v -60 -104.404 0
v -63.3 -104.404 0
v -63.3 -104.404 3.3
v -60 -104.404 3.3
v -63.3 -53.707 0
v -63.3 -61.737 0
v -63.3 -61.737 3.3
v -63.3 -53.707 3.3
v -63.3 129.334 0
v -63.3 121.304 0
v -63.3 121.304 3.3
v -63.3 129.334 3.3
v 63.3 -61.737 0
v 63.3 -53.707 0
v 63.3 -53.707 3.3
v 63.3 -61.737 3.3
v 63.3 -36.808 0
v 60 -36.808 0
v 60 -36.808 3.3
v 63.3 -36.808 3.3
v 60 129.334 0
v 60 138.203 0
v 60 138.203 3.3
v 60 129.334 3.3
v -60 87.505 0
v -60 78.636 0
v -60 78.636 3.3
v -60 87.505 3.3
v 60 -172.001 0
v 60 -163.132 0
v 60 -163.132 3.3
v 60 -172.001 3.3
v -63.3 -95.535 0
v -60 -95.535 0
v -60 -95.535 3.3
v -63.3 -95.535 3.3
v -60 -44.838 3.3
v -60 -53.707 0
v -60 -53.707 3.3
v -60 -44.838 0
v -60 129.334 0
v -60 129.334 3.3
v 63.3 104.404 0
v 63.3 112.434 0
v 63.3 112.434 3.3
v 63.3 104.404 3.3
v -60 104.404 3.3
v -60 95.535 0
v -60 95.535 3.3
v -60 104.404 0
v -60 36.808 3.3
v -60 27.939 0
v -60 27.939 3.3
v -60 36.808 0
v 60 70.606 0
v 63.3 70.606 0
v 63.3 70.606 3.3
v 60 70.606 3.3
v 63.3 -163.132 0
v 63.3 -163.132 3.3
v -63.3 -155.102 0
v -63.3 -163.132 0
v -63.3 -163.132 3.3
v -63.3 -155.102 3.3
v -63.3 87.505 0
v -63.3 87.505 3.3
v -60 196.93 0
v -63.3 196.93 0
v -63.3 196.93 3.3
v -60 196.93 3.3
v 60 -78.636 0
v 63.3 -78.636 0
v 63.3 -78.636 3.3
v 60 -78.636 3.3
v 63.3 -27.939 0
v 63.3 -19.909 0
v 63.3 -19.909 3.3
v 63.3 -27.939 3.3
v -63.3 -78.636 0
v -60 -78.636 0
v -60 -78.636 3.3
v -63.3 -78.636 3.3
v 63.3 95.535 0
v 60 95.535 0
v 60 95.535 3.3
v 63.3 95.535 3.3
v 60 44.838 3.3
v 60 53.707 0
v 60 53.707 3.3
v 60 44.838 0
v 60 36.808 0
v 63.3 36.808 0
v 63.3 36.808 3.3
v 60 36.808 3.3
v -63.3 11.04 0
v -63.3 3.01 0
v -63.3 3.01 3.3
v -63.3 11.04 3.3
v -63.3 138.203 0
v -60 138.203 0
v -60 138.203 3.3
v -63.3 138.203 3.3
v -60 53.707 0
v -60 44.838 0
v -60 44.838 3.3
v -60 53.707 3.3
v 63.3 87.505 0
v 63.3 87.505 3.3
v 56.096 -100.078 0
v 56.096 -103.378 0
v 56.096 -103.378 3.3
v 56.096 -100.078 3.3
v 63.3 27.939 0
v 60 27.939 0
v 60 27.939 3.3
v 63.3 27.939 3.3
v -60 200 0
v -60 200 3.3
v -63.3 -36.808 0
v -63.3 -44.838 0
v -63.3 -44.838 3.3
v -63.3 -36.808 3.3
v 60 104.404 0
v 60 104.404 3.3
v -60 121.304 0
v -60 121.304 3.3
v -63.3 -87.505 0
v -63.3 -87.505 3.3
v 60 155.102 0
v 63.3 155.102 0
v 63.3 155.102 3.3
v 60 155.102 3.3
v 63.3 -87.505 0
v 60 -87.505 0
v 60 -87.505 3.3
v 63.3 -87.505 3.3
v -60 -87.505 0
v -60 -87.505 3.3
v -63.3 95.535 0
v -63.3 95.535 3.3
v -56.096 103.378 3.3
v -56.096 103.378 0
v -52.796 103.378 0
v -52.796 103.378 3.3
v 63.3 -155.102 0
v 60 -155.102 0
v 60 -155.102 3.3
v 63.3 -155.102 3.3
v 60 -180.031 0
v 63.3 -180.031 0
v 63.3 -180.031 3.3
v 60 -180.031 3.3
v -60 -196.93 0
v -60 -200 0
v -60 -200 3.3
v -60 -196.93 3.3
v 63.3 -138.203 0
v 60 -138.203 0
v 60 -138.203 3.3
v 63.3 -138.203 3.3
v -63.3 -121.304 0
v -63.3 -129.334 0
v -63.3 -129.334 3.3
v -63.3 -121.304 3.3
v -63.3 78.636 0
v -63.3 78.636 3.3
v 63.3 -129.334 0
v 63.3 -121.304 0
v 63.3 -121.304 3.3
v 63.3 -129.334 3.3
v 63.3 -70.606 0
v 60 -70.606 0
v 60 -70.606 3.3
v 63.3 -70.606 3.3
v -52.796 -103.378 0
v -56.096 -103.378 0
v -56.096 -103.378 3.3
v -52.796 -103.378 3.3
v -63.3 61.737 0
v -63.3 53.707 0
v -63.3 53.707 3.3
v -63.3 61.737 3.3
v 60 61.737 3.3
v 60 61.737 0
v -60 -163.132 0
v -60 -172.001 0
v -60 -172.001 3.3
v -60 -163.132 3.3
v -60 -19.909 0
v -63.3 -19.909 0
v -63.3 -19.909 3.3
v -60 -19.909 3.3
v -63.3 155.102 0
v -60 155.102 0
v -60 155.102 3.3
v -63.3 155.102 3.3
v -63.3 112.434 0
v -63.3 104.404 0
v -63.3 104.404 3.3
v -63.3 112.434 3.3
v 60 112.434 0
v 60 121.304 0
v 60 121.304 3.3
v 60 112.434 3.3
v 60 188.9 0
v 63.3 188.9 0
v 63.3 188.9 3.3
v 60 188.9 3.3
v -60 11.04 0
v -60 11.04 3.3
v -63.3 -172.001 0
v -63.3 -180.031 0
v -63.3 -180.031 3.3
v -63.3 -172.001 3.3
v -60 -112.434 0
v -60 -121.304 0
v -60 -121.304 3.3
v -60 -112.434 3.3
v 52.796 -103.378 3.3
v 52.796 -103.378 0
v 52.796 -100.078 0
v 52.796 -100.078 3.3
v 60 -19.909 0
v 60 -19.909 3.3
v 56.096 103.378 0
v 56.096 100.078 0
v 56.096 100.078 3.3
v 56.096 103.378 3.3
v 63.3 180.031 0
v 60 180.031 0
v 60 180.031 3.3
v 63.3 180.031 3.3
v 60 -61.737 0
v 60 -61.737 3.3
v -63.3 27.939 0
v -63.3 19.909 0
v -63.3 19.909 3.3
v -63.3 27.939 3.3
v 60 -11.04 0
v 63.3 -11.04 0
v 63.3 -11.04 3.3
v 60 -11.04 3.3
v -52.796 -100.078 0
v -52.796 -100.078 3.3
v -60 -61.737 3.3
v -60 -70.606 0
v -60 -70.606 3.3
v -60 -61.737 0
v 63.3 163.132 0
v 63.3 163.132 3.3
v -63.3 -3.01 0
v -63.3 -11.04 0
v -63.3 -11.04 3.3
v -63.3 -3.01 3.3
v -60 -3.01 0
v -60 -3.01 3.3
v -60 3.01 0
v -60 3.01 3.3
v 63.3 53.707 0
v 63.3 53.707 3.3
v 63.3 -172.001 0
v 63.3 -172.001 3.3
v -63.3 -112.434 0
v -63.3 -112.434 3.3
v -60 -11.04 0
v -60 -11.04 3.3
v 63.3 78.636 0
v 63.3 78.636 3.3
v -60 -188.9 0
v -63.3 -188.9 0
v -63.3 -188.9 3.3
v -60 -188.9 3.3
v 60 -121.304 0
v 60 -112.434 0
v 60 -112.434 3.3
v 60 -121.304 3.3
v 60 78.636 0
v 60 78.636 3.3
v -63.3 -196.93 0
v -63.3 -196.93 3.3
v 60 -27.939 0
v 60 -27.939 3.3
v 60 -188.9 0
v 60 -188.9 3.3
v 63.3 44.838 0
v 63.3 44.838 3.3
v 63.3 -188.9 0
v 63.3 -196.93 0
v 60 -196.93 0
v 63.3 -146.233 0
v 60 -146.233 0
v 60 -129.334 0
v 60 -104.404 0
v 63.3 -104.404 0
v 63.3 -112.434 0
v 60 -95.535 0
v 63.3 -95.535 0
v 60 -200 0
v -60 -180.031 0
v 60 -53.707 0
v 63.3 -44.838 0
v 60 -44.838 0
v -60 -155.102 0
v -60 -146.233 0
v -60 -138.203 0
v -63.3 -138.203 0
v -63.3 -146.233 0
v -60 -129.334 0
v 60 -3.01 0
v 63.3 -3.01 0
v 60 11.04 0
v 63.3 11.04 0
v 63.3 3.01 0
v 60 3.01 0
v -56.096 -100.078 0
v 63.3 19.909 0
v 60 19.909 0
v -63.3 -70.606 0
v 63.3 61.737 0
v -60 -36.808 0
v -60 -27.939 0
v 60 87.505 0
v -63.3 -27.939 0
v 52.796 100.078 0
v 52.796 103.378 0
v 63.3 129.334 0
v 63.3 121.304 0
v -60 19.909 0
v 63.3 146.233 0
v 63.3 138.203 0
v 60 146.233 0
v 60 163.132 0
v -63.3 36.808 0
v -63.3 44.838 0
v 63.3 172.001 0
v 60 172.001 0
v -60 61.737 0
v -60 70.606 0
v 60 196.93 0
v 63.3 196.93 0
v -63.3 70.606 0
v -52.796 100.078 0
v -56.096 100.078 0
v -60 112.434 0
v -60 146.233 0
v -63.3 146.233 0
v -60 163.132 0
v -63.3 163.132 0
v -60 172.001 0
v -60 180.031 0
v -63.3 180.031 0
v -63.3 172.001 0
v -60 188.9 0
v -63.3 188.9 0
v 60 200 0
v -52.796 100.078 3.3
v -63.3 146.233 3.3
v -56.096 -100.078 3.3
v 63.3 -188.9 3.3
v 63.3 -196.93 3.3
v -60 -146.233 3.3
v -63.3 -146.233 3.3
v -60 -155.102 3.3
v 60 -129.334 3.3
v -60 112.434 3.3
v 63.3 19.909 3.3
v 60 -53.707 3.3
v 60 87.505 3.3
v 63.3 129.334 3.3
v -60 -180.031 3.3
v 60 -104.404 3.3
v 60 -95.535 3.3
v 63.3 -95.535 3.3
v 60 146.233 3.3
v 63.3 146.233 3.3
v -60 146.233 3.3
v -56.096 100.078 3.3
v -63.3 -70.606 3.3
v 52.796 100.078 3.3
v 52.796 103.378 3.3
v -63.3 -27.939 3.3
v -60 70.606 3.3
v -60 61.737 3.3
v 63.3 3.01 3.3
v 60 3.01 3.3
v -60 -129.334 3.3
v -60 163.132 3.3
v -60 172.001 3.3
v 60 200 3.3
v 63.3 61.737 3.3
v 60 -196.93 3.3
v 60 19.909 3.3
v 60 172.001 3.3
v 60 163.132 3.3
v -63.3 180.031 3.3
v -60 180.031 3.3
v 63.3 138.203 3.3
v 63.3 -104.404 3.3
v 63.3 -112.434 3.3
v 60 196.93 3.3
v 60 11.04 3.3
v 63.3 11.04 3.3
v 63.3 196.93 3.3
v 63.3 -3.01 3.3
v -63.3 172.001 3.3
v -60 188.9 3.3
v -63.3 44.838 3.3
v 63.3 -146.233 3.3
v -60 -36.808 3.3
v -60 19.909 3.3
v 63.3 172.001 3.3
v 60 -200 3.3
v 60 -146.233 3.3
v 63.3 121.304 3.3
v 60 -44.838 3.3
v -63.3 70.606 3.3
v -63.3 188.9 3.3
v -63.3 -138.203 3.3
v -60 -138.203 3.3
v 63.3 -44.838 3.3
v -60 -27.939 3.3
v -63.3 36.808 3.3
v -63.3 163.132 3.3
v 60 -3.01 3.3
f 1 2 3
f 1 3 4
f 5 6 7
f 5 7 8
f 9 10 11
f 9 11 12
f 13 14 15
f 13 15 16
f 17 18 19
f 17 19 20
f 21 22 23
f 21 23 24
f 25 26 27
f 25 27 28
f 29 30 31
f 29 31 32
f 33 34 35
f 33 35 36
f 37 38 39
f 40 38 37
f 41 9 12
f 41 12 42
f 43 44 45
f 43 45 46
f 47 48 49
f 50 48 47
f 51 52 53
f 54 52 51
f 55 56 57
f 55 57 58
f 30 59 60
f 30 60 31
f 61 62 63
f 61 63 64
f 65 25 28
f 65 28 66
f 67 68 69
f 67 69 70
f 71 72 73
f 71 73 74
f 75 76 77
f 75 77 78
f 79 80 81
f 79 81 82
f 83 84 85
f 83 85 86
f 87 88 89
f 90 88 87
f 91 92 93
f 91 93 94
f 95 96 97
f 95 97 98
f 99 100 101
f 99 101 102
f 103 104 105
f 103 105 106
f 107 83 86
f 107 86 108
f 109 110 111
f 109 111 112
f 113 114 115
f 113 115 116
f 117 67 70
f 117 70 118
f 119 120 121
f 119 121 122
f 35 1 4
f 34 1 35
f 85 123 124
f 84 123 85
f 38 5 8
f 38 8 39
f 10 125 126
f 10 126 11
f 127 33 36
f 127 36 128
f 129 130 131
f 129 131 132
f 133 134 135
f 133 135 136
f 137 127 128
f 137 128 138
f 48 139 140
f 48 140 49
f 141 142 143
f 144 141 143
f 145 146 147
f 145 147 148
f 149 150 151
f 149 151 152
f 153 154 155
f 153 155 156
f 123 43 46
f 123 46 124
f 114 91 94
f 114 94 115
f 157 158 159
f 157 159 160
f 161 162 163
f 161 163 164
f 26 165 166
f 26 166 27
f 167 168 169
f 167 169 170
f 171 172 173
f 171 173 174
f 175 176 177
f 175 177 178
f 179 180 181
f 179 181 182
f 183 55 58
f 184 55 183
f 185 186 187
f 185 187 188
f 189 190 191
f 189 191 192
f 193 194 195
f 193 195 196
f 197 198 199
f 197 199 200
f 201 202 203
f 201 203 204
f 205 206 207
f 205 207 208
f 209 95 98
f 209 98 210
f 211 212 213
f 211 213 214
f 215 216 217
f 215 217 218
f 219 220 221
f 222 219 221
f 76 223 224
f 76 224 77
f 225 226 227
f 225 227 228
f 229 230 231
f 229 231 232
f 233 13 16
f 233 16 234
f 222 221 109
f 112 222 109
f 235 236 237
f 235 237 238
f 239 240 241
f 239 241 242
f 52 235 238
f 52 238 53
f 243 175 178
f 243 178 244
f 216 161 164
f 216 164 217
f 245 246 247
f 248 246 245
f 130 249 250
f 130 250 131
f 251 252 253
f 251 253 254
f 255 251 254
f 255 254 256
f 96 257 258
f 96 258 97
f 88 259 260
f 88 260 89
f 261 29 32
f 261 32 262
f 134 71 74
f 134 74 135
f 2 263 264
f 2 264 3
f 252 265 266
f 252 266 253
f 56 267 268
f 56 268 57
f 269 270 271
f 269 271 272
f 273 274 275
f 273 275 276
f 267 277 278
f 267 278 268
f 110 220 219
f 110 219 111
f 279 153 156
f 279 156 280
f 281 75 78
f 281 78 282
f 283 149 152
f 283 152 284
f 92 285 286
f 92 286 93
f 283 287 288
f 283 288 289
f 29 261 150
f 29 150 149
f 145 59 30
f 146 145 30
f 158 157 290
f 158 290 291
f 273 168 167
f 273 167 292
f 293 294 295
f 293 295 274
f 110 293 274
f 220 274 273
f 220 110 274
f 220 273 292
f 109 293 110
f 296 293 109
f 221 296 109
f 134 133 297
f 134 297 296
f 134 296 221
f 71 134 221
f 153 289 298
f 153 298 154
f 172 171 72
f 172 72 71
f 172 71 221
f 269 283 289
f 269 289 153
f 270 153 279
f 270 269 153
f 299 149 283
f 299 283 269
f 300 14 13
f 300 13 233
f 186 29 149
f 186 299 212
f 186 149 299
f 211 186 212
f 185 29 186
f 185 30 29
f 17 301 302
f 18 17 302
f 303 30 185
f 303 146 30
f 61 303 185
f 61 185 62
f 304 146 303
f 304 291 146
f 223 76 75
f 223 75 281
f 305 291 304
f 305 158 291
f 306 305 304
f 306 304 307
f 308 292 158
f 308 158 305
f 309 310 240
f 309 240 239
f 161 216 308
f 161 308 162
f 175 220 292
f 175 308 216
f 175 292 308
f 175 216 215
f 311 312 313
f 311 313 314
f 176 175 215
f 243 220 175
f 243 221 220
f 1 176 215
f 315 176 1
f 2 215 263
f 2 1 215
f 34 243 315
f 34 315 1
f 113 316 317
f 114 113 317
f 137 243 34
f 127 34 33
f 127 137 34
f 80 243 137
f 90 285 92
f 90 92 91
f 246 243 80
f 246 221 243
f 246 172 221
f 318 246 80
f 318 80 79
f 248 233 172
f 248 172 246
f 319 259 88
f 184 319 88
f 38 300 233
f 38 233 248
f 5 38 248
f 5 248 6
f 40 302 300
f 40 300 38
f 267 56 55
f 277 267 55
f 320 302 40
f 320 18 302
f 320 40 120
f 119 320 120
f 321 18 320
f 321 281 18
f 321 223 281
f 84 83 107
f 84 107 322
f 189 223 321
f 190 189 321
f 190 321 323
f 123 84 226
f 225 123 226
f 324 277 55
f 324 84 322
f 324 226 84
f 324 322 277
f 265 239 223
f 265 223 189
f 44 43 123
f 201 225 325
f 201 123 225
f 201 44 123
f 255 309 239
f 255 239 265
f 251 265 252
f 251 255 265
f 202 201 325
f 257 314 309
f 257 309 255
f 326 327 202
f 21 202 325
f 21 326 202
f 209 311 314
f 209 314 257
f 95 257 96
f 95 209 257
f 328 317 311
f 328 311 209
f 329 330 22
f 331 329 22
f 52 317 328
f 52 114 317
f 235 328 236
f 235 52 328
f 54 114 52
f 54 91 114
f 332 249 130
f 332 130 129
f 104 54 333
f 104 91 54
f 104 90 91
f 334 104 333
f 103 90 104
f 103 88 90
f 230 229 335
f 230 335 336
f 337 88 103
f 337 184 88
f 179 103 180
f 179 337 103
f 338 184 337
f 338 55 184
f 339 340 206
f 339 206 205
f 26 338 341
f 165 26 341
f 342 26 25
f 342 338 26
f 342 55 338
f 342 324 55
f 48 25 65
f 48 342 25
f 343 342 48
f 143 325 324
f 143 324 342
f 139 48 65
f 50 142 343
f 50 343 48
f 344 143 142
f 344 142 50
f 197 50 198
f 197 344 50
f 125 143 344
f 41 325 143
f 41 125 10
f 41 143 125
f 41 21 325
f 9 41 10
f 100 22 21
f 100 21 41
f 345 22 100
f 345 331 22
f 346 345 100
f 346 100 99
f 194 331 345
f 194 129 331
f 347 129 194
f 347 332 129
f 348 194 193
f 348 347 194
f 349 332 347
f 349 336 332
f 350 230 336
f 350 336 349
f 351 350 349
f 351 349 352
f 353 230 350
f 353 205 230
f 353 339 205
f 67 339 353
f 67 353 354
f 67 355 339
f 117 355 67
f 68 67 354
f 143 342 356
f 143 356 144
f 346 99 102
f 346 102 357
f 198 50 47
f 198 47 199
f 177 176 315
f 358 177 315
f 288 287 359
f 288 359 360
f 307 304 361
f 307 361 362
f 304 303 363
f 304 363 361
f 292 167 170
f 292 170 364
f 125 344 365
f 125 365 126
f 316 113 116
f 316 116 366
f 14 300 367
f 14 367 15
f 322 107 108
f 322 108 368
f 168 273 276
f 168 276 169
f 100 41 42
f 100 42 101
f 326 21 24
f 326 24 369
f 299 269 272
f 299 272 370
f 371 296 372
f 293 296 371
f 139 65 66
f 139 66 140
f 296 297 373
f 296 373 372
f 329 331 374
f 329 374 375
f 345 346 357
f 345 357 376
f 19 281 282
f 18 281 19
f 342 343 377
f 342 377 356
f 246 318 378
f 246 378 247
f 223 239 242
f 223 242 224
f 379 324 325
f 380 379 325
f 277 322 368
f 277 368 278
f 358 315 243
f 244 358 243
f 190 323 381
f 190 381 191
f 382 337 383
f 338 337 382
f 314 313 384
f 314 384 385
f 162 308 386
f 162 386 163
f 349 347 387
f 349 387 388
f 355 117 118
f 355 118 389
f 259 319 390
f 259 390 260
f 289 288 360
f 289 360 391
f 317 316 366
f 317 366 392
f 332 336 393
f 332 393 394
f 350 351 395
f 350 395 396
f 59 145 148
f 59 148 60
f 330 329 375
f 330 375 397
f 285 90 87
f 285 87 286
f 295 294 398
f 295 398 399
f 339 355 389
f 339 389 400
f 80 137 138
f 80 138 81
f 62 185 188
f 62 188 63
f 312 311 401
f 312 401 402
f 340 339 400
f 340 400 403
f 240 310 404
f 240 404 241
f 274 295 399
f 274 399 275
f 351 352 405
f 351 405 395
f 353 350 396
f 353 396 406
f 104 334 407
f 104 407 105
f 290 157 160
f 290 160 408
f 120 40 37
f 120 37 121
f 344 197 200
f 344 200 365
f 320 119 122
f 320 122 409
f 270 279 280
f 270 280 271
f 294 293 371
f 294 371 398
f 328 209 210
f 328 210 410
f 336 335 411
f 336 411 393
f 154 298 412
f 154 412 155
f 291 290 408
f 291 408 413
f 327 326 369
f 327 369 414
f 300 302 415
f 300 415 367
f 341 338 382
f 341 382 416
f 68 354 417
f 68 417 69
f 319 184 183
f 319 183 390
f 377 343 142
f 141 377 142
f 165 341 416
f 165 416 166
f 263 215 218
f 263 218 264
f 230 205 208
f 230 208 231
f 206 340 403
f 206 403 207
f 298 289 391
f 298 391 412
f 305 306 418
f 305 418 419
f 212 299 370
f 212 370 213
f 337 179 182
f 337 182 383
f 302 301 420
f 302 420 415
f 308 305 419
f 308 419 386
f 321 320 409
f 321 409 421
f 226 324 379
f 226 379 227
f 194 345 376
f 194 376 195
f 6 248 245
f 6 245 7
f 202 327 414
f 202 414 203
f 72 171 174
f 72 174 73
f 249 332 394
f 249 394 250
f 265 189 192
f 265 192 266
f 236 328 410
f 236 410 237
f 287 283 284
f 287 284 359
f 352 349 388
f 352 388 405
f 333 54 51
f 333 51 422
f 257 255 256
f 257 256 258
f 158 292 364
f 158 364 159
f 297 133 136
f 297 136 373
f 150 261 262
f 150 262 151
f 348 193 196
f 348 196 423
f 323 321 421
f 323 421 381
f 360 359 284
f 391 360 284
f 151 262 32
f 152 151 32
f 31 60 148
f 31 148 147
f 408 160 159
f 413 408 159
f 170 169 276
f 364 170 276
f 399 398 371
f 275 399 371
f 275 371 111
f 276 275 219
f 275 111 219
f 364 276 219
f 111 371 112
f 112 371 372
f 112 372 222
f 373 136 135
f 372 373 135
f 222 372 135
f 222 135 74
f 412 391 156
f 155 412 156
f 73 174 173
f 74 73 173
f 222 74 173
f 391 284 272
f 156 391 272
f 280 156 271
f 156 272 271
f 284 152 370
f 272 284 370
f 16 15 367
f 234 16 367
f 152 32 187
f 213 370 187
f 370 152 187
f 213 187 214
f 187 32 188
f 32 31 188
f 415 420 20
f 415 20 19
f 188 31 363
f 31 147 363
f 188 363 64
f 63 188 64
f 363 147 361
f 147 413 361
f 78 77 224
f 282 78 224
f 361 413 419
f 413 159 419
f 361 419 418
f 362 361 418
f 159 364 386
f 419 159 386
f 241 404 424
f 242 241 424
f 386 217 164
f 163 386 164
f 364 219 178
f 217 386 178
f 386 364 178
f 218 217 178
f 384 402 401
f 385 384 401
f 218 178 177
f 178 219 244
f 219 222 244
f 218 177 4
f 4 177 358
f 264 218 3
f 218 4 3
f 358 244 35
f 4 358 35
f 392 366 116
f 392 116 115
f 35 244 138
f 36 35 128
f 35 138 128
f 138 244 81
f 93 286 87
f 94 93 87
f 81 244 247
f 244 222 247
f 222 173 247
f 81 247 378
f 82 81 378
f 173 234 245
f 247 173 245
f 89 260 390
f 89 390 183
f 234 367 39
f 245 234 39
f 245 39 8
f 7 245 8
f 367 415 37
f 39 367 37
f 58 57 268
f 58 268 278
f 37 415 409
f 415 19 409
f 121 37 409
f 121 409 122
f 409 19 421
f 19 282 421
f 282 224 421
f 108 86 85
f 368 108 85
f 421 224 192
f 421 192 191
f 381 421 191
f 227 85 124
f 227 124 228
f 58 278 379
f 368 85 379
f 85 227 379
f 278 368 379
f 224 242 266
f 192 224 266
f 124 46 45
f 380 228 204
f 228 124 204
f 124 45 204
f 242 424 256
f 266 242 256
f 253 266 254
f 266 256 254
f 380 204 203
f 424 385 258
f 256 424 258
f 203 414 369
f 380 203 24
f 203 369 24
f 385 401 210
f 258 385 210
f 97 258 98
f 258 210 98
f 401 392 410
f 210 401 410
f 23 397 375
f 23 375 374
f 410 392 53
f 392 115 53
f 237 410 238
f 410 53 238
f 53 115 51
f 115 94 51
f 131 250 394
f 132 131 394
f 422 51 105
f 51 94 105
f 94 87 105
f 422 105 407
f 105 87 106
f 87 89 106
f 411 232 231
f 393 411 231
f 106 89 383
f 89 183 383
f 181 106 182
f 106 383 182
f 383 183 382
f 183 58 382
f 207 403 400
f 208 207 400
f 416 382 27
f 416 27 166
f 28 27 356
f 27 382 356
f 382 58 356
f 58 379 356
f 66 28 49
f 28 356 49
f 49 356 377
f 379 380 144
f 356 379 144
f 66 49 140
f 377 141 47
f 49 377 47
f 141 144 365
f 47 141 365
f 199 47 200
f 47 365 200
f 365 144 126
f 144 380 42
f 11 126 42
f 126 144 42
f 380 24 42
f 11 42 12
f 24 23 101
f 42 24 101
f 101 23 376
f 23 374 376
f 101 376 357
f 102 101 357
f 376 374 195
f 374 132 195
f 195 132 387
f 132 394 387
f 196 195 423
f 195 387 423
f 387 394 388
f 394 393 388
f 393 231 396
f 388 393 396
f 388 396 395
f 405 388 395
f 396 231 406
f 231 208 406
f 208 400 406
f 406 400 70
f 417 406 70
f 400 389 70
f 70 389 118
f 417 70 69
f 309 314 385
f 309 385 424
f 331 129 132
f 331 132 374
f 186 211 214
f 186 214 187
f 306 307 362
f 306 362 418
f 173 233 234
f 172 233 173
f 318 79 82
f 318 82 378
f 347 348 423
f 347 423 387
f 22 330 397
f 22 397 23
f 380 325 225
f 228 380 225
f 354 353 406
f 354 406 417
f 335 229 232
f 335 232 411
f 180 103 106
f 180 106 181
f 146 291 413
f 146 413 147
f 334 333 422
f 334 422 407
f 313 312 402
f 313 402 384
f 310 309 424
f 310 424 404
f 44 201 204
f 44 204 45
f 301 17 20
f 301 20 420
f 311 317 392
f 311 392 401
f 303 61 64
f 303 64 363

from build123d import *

# Parameters (mm, degrees)
CROQUIS1_W              = 3.3
CROQUIS1_H              = 3.3
SALIENTE_EXTRUIR1_DEPTH = 3.3


with BuildPart() as part:
    # Croquis1 → Saliente-Extruir1 (new body)
    with BuildSketch(Plane.XY):
        Polygon((63.3, 27.9389154), (60, 27.9389154), (60, 36.80802386), (63.3, 36.80802386), (63.3, 44.83802386), (60, 44.83802386), (60, 53.70713232), (63.3, 53.70713232), (63.3, 61.73713232), (60, 61.73713232), (60, 70.60624078), (63.3, 70.60624078), (63.3, 78.63624078), (60, 78.63624078), (60, 87.50534924), (63.3, 87.50534924), (63.3, 95.53534924), (60, 95.53534924), (60, 104.4044577), (63.3, 104.4044577), (63.3, 112.4344577), (60, 112.4344577), (60, 121.30356616), (63.3, 121.30356616), (63.3, 129.33356616), (60, 129.33356616), (60, 138.20267462), (63.3, 138.20267462), (63.3, 146.23267462), (60, 146.23267462), (60, 155.10178308), (63.3, 155.10178308), (63.3, 163.13178308), (60, 163.13178308), (60, 172.00089154), (63.3, 172.00089154), (63.3, 180.03089154), (60, 180.03089154), (60, 188.9), (63.3, 188.9), (63.3, 196.93), (60, 196.93), (60, 200), (-60, 200), (-60, 196.93), (-63.3, 196.93), (-63.3, 188.9), (-60, 188.9), (-60, 180.03089154), (-63.3, 180.03089154), (-63.3, 172.00089154), (-60, 172.00089154), (-60, 163.13178308), (-63.3, 163.13178308), (-63.3, 155.10178308), (-60, 155.10178308), (-60, 146.23267462), (-63.3, 146.23267462), (-63.3, 138.20267462), (-60, 138.20267462), (-60, 129.33356616), (-63.3, 129.33356616), (-63.3, 121.30356616), (-60, 121.30356616), (-60, 112.4344577), (-63.3, 112.4344577), (-63.3, 104.4044577), (-60, 104.4044577), (-60, 95.53534924), (-63.3, 95.53534924), (-63.3, 87.50534924), (-60, 87.50534924), (-60, 78.63624078), (-63.3, 78.63624078), (-63.3, 70.60624078), (-60, 70.60624078), (-60, 61.73713232), (-63.3, 61.73713232), (-63.3, 53.70713232), (-60, 53.70713232), (-60, 44.83802386), (-63.3, 44.83802386), (-63.3, 36.80802386), (-60, 36.80802386), (-60, 27.9389154), (-63.3, 27.9389154), (-63.3, 19.9089154), (-60, 19.9089154), (-60, 11.03980694), (-63.3, 11.03980694), (-63.3, 3.00980694), (-60, 3.00980694), (-60, -3.00980694), (-63.3, -3.00980694), (-63.3, -11.03980694), (-60, -11.03980694), (-60, -19.9089154), (-63.3, -19.9089154), (-63.3, -27.9389154), (-60, -27.9389154), (-60, -36.80802386), (-63.3, -36.80802386), (-63.3, -44.83802386), (-60, -44.83802386), (-60, -53.70713232), (-63.3, -53.70713232), (-63.3, -61.73713232), (-60, -61.73713232), (-60, -70.60624078), (-63.3, -70.60624078), (-63.3, -78.63624078), (-60, -78.63624078), (-60, -87.50534924), (-63.3, -87.50534924), (-63.3, -95.53534924), (-60, -95.53534924), (-60, -104.4044577), (-63.3, -104.4044577), (-63.3, -112.4344577), (-60, -112.4344577), (-60, -121.30356616), (-63.3, -121.30356616), (-63.3, -129.33356616), (-60, -129.33356616), (-60, -138.20267462), (-63.3, -138.20267462), (-63.3, -146.23267462), (-60, -146.23267462), (-60, -155.10178308), (-63.3, -155.10178308), (-63.3, -163.13178308), (-60, -163.13178308), (-60, -172.00089154), (-63.3, -172.00089154), (-63.3, -180.03089154), (-60, -180.03089154), (-60, -188.9), (-63.3, -188.9), (-63.3, -196.93), (-60, -196.93), (-60, -200), (60, -200), (60, -196.93), (63.3, -196.93), (63.3, -188.9), (60, -188.9), (60, -180.03089154), (63.3, -180.03089154), (63.3, -172.00089154), (60, -172.00089154), (60, -163.13178308), (63.3, -163.13178308), (63.3, -155.10178308), (60, -155.10178308), (60, -146.23267462), (63.3, -146.23267462), (63.3, -138.20267462), (60, -138.20267462), (60, -129.33356616), (63.3, -129.33356616), (63.3, -121.30356616), (60, -121.30356616), (60, -112.4344577), (63.3, -112.4344577), (63.3, -104.4044577), (60, -104.4044577), (60, -95.53534924), (63.3, -95.53534924), (63.3, -87.50534924), (60, -87.50534924), (60, -78.63624078), (63.3, -78.63624078), (63.3, -70.60624078), (60, -70.60624078), (60, -61.73713232), (63.3, -61.73713232), (63.3, -53.70713232), (60, -53.70713232), (60, -44.83802386), (63.3, -44.83802386), (63.3, -36.80802386), (60, -36.80802386), (60, -27.9389154), (63.3, -27.9389154), (63.3, -19.9089154), (60, -19.9089154), (60, -11.03980694), (63.3, -11.03980694), (63.3, -3.00980694), (60, -3.00980694), (60, 3.00980694), (63.3, 3.00980694), (63.3, 11.03980694), (60, 11.03980694), (60, 19.9089154), (63.3, 19.9089154), align=None)
        with Locations((-54.44567586, -101.72796576)):
            Rectangle(CROQUIS1_W, CROQUIS1_H, mode=Mode.SUBTRACT)
        with Locations((54.44567586, -101.72796576)):
            Rectangle(CROQUIS1_W, CROQUIS1_H, mode=Mode.SUBTRACT)
        with Locations((-54.44567586, 101.72796576)):
            Rectangle(CROQUIS1_W, CROQUIS1_H, mode=Mode.SUBTRACT)
        with Locations((54.44567586, 101.72796576)):
            Rectangle(CROQUIS1_W, CROQUIS1_H, mode=Mode.SUBTRACT)
    extrude(amount=SALIENTE_EXTRUIR1_DEPTH)


solid = part.part
